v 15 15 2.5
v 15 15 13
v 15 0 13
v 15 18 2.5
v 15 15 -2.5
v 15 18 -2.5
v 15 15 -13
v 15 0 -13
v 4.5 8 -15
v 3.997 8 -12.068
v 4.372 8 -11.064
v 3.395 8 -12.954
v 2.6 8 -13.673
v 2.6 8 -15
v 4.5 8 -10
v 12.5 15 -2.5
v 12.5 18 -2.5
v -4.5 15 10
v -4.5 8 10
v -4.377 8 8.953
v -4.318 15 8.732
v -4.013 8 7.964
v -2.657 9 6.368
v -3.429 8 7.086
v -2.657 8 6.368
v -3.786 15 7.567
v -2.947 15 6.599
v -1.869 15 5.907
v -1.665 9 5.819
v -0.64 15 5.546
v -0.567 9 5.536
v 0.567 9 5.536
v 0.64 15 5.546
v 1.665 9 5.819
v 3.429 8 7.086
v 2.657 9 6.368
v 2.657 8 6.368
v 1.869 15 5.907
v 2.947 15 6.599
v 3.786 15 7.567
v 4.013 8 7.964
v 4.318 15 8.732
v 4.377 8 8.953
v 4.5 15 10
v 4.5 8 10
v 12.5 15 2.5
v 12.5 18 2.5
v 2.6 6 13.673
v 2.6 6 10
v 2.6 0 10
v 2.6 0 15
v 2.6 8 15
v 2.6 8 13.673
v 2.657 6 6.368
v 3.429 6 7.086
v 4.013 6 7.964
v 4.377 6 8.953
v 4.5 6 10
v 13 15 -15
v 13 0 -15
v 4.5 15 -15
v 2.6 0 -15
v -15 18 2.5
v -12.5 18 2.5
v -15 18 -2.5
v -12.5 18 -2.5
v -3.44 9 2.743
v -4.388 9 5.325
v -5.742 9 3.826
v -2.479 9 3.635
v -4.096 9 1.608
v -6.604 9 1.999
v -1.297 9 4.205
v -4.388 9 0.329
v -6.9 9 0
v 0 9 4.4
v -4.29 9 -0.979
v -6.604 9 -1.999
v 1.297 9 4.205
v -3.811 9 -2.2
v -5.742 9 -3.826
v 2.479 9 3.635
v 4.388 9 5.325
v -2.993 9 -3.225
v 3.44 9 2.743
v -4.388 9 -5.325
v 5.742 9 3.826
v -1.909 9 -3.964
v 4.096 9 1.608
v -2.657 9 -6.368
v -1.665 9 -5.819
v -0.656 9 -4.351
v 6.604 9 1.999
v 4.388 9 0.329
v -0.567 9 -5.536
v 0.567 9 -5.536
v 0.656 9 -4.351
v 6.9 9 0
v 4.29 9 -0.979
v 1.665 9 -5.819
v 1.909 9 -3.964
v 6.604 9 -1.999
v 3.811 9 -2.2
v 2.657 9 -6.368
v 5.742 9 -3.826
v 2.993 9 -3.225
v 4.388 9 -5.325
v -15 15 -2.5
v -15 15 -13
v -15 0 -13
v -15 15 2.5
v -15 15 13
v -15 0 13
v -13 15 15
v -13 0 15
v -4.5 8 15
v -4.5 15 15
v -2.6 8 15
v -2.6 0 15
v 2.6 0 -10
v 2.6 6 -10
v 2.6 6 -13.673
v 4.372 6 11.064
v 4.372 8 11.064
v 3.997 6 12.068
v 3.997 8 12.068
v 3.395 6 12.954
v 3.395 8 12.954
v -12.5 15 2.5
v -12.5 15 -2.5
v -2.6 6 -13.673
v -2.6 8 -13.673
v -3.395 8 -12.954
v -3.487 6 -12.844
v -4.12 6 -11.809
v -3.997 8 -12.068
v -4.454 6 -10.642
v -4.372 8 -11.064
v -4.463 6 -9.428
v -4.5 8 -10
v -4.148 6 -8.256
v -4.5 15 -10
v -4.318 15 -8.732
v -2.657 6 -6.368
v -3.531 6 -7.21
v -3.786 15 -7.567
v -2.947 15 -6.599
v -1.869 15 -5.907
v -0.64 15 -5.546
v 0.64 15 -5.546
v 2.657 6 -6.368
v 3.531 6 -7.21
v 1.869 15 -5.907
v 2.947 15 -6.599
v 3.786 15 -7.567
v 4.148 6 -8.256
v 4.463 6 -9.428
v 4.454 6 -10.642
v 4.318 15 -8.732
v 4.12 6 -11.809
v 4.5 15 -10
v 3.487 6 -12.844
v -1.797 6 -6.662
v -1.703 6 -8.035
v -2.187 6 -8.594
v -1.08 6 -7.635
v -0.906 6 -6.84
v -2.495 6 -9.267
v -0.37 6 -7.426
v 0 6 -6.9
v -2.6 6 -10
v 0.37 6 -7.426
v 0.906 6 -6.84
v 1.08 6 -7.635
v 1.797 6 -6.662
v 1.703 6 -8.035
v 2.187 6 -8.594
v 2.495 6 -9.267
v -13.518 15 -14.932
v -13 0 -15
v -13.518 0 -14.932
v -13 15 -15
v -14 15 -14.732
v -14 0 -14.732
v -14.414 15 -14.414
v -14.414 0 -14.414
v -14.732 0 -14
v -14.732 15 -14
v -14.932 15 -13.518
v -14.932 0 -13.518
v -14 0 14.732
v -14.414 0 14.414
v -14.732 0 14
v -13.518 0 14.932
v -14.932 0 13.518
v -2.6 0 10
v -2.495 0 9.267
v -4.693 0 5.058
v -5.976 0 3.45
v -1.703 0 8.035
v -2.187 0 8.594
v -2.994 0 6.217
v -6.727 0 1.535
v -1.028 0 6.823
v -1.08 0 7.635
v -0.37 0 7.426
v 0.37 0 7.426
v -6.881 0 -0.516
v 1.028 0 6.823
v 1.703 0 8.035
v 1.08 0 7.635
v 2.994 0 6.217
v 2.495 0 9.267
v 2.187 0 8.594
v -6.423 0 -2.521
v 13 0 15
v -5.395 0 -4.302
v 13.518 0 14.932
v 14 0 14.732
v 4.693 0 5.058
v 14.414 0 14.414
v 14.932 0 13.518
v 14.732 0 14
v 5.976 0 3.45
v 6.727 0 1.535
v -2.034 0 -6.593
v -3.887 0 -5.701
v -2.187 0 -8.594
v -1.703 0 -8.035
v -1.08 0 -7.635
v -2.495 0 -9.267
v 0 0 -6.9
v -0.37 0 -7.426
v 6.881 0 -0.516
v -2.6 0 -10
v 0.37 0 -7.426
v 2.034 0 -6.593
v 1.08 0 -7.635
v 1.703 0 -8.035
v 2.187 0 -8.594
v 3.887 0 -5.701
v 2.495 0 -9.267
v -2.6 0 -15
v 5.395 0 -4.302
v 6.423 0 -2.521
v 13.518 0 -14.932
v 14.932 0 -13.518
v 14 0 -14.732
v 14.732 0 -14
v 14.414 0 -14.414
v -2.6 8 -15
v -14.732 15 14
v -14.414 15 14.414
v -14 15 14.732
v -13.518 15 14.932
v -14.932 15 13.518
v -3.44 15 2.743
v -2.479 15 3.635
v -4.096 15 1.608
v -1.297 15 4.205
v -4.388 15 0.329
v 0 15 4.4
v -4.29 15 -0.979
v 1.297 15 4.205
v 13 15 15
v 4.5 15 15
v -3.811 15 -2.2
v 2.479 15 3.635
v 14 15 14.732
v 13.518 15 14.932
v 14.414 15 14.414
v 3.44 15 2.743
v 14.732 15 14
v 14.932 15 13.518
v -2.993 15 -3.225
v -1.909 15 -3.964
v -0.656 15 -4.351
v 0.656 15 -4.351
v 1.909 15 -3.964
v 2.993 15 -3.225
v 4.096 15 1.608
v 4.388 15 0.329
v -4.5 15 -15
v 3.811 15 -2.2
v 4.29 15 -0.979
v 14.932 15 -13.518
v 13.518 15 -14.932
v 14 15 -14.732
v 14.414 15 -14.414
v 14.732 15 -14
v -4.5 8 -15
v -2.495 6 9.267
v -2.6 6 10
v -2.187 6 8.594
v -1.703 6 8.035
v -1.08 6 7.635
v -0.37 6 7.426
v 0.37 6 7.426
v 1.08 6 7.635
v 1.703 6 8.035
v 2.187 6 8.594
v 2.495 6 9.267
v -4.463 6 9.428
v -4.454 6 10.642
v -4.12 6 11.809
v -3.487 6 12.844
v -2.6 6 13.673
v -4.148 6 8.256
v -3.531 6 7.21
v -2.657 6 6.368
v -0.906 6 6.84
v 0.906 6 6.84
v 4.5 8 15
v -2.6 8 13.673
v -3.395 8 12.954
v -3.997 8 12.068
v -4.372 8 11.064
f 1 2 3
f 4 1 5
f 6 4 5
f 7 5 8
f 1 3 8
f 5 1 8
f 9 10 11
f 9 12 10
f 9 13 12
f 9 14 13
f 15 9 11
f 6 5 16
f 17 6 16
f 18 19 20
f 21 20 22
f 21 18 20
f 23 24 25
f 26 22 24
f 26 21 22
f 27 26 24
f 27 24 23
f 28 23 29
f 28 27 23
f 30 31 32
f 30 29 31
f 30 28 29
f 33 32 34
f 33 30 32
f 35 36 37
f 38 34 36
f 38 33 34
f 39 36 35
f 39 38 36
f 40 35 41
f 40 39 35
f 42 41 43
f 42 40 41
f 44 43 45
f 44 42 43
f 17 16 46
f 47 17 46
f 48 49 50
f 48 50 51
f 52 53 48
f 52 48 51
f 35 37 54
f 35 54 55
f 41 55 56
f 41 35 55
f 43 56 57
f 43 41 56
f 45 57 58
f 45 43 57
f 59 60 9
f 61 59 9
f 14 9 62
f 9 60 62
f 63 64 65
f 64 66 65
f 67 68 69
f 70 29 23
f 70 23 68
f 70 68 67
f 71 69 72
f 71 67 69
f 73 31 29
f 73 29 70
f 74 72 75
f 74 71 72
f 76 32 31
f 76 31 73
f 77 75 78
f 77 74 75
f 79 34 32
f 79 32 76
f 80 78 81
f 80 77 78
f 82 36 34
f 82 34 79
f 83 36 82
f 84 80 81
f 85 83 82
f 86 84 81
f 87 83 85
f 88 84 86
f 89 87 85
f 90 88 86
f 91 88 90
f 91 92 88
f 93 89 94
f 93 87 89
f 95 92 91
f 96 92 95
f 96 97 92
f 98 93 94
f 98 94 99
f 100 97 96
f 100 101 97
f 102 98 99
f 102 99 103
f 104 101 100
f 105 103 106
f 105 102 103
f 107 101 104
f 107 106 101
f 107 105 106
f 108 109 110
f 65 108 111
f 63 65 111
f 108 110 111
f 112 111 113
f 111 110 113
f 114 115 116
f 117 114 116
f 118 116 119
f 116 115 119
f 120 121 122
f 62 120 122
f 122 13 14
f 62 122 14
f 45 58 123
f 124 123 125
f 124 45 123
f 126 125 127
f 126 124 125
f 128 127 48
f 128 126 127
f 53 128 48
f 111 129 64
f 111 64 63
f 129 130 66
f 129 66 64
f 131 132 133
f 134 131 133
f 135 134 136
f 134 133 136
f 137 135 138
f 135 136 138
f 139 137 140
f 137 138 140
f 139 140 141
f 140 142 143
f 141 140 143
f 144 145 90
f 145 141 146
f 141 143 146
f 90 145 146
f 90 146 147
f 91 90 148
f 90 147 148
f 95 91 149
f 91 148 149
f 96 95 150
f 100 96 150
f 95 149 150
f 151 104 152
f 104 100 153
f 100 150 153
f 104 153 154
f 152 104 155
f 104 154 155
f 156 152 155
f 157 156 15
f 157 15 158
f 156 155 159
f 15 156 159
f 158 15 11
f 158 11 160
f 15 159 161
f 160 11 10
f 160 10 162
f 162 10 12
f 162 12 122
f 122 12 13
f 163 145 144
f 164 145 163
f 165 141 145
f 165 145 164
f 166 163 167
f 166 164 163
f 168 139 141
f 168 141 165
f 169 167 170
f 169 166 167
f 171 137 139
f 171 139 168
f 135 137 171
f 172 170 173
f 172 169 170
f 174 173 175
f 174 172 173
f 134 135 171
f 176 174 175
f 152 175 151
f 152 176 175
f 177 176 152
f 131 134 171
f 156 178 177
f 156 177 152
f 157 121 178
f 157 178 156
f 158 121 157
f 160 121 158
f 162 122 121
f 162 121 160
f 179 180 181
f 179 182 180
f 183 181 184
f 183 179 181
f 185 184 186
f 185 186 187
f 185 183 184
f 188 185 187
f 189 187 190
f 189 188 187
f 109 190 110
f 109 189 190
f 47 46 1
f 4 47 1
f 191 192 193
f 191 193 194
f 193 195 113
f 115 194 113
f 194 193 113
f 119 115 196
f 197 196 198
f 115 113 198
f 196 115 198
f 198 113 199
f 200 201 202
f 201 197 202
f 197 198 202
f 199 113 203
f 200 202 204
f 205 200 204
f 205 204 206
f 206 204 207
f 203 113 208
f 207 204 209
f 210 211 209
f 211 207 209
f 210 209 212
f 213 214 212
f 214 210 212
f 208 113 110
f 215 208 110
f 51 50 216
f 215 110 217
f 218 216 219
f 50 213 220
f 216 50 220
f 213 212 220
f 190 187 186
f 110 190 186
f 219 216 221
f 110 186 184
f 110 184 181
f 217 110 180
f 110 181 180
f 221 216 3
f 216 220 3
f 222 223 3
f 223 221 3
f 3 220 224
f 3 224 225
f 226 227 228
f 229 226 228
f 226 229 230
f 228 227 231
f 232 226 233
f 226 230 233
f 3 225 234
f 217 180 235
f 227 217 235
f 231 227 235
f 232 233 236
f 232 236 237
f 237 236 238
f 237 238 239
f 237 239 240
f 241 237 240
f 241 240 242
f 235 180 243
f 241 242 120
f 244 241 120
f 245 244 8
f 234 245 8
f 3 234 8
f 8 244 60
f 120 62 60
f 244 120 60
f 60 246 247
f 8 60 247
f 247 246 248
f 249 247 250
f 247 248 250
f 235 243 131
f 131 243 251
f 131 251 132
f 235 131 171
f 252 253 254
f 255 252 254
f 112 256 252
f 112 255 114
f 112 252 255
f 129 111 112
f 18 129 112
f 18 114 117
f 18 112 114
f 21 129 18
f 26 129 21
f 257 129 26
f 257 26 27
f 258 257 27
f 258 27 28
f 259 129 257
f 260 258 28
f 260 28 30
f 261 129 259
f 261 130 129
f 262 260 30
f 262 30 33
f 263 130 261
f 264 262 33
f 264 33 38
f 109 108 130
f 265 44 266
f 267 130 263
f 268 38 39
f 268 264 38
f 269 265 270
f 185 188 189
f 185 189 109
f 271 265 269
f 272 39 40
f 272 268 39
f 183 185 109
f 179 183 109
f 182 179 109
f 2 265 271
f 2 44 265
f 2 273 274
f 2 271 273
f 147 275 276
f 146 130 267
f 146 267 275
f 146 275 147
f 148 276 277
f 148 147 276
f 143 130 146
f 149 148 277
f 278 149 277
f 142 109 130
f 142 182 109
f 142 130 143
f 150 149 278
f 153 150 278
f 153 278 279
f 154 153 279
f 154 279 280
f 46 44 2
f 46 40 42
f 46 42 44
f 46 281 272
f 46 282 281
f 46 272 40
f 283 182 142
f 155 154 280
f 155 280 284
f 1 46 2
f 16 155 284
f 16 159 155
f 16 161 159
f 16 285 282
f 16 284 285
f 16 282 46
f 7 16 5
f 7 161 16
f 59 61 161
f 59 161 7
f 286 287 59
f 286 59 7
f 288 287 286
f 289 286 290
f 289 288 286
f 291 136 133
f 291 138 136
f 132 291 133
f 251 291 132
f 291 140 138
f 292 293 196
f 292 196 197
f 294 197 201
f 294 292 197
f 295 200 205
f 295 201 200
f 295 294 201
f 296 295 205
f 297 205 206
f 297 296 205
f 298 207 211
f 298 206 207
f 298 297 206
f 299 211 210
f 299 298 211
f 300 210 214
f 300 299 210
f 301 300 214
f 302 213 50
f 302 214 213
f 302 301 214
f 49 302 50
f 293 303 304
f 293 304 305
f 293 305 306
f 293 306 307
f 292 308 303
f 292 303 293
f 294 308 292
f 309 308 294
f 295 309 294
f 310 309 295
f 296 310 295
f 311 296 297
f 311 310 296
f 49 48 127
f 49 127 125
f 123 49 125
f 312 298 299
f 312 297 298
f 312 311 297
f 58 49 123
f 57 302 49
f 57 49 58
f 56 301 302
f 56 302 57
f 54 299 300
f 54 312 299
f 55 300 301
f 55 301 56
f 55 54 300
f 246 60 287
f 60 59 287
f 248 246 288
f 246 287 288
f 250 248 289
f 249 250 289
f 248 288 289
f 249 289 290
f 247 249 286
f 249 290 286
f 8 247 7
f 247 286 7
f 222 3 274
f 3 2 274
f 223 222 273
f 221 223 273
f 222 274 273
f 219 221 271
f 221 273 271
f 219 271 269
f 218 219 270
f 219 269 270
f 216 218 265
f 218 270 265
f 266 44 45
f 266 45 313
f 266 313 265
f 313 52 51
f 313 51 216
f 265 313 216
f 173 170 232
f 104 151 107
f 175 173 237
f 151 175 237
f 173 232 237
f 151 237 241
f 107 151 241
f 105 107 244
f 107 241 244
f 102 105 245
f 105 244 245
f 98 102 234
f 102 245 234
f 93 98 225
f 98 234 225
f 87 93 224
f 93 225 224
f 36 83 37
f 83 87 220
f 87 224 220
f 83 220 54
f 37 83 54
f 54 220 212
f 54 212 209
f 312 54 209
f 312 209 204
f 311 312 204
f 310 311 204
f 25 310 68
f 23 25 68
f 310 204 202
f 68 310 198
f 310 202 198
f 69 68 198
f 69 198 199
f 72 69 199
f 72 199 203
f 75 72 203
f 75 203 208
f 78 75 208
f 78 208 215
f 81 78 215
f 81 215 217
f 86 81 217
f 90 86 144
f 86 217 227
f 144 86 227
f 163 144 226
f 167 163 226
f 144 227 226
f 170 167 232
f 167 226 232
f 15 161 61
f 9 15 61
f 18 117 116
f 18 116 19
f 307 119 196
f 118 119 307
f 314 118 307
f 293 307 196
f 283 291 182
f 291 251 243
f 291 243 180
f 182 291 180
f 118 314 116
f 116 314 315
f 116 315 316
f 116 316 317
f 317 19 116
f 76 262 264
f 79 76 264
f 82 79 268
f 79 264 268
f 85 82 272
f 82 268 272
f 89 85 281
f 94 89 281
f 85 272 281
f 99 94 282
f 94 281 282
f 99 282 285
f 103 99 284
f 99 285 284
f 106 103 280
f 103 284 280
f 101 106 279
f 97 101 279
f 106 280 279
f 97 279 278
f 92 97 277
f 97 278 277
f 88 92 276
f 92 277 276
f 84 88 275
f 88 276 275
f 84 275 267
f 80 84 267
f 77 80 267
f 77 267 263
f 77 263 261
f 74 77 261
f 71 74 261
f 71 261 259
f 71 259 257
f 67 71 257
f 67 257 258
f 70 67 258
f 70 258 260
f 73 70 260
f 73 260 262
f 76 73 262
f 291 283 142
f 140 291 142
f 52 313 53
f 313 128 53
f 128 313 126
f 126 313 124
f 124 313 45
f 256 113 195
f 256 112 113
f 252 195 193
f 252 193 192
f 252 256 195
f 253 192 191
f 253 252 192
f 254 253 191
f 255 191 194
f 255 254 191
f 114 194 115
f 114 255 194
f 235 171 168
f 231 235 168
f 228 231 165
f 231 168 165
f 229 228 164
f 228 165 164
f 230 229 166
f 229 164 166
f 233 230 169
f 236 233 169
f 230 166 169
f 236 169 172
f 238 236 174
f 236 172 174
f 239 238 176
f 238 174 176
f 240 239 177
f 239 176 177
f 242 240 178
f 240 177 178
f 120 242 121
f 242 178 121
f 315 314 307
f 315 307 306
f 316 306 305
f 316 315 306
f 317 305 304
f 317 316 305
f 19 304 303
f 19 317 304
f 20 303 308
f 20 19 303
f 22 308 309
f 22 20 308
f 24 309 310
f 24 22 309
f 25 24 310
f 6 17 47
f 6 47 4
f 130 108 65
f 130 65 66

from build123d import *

# Parameters (mm, degrees)
EXTRUDE_1_DEPTH     = 15
EXTRUDE_2_DEPTH     = 3
SKETCH_3_R          = 4.4
CUT_EXTRUDE_1_DEPTH = 26.980762113533164
SKETCH_4_R          = 6.9
CUT_EXTRUDE_2_DEPTH = 9
CUT_EXTRUDE_3_DEPTH = 7
SKETCH_6_R          = 4.5
SKETCH_6_R_2        = 4.499999999999997
CUT_EXTRUDE_4_DEPTH = 2
FILLET_1_R          = 2


with BuildPart() as part:
    # Эскиз1 → Бобышка-Вытянуть1 (new body)
    with BuildSketch(Plane(origin=(0, 0, 0), x_dir=(1, 0, 0), z_dir=(0, 1, 0))):
        Polygon((14.999999999999998, 15.000000000000004), (-15.000000000000002, 15), (-14.999999999999998, -15), (15.000000000000002, -14.999999999999996), align=None)
    extrude(amount=EXTRUDE_1_DEPTH)

    # Эскиз2 → Бобышка-Вытянуть2 (add)
    with BuildSketch(Plane(origin=(0, 15, 0), x_dir=(1, 0, 0), z_dir=(0, 1, 0))):
        Polygon((-12.5, -2.499999999999997), (-15.000000000000002, -2.4999999999999973), (-15.000000000000002, 2.5000000000000027), (-12.5, 2.500000000000003), align=None)
        Polygon((15.000000000000002, -2.4999999999999973), (15.000000000000002, 2.5000000000000027), (12.5, 2.500000000000003), (12.5, -2.499999999999997), align=None)
    extrude(amount=EXTRUDE_2_DEPTH)

    # Эскиз3 → Вырез-Вытянуть1 (cut, through all)
    with BuildSketch(Plane(origin=(0, 15, 0), x_dir=(1, 0, 0), z_dir=(0, 1, 0))):
        with Locations(Location((0, 0, 0), (0, 0, 270))):
            Circle(SKETCH_3_R)
        with BuildLine():
            Line((-2.6, -15), (-2.6, -10))
            ThreePointArc((-2.6, -10), (1.6e-16, -7.4), (2.6, -10))
            Line((2.6, -10), (2.6, -15))
            Line((2.6, -15), (-2.6, -15))
        make_face()
        with BuildLine():
            Line((2.5999999999999974, 10), (2.6, 15))
            Line((2.6, 15), (-2.6, 15))
            Line((-2.6, 15), (-2.6000000000000023, 10))
            ThreePointArc((-2.6000000000000023, 10), (-2.93e-15, 7.4), (2.5999999999999974, 10))
        make_face()
    extrude(amount=-CUT_EXTRUDE_1_DEPTH, mode=Mode.SUBTRACT)

    # Эскиз4 → Вырез-Вытянуть2 (cut)
    with BuildSketch(Plane.XZ):
        with Locations(Location((0, 0, 0), (0, 0, 270))):
            Circle(SKETCH_4_R)
    extrude(amount=-CUT_EXTRUDE_2_DEPTH, mode=Mode.SUBTRACT)

    # Эскиз5 → Вырез-Вытянуть3 (cut)
    with BuildSketch(Plane(origin=(0, 15, 0), x_dir=(1, 0, 0), z_dir=(0, 1, 0))):
        with BuildLine():
            Line((-4.499999999999999, -15), (-4.5, -10))
            ThreePointArc((-4.5, -10), (2.8e-16, -5.5), (4.5, -10))
            Line((4.5, -10), (4.500000000000001, -15))
            Line((4.500000000000001, -15), (-4.499999999999999, -15))
        make_face()
        with BuildLine():
            Line((4.5, 10), (4.500000000000001, 15))
            Line((4.500000000000001, 15), (-4.499999999999999, 15))
            Line((-4.499999999999999, 15), (-4.5, 10))
            ThreePointArc((-4.5, 10), (-8.3e-16, 5.5), (4.5, 10))
        make_face()
    extrude(amount=-CUT_EXTRUDE_3_DEPTH, mode=Mode.SUBTRACT)

    # Эскиз6 → Вырез-Вытянуть4 (cut)
    with BuildSketch(Plane(origin=(0, 8, 0), x_dir=(1, 0, 0), z_dir=(0, 1, 0))):
        with Locations((0, -10)):
            Circle(SKETCH_6_R)
        with Locations((-2.45e-15, 10)):
            Circle(SKETCH_6_R_2)
    extrude(amount=-CUT_EXTRUDE_4_DEPTH, mode=Mode.SUBTRACT)

    # Скругление1
    fillet_1_edges = [part.edges().sort_by_distance(p)[0] for p in [
        (-15.000000000000002, 7.5, -15),
        (14.999999999999998, 7.5, -15.000000000000004),
        (15.000000000000002, 7.5, 14.999999999999996),
        (-14.999999999999998, 7.5, 15),
    ]]
    fillet(fillet_1_edges, radius=FILLET_1_R)


solid = part.part
